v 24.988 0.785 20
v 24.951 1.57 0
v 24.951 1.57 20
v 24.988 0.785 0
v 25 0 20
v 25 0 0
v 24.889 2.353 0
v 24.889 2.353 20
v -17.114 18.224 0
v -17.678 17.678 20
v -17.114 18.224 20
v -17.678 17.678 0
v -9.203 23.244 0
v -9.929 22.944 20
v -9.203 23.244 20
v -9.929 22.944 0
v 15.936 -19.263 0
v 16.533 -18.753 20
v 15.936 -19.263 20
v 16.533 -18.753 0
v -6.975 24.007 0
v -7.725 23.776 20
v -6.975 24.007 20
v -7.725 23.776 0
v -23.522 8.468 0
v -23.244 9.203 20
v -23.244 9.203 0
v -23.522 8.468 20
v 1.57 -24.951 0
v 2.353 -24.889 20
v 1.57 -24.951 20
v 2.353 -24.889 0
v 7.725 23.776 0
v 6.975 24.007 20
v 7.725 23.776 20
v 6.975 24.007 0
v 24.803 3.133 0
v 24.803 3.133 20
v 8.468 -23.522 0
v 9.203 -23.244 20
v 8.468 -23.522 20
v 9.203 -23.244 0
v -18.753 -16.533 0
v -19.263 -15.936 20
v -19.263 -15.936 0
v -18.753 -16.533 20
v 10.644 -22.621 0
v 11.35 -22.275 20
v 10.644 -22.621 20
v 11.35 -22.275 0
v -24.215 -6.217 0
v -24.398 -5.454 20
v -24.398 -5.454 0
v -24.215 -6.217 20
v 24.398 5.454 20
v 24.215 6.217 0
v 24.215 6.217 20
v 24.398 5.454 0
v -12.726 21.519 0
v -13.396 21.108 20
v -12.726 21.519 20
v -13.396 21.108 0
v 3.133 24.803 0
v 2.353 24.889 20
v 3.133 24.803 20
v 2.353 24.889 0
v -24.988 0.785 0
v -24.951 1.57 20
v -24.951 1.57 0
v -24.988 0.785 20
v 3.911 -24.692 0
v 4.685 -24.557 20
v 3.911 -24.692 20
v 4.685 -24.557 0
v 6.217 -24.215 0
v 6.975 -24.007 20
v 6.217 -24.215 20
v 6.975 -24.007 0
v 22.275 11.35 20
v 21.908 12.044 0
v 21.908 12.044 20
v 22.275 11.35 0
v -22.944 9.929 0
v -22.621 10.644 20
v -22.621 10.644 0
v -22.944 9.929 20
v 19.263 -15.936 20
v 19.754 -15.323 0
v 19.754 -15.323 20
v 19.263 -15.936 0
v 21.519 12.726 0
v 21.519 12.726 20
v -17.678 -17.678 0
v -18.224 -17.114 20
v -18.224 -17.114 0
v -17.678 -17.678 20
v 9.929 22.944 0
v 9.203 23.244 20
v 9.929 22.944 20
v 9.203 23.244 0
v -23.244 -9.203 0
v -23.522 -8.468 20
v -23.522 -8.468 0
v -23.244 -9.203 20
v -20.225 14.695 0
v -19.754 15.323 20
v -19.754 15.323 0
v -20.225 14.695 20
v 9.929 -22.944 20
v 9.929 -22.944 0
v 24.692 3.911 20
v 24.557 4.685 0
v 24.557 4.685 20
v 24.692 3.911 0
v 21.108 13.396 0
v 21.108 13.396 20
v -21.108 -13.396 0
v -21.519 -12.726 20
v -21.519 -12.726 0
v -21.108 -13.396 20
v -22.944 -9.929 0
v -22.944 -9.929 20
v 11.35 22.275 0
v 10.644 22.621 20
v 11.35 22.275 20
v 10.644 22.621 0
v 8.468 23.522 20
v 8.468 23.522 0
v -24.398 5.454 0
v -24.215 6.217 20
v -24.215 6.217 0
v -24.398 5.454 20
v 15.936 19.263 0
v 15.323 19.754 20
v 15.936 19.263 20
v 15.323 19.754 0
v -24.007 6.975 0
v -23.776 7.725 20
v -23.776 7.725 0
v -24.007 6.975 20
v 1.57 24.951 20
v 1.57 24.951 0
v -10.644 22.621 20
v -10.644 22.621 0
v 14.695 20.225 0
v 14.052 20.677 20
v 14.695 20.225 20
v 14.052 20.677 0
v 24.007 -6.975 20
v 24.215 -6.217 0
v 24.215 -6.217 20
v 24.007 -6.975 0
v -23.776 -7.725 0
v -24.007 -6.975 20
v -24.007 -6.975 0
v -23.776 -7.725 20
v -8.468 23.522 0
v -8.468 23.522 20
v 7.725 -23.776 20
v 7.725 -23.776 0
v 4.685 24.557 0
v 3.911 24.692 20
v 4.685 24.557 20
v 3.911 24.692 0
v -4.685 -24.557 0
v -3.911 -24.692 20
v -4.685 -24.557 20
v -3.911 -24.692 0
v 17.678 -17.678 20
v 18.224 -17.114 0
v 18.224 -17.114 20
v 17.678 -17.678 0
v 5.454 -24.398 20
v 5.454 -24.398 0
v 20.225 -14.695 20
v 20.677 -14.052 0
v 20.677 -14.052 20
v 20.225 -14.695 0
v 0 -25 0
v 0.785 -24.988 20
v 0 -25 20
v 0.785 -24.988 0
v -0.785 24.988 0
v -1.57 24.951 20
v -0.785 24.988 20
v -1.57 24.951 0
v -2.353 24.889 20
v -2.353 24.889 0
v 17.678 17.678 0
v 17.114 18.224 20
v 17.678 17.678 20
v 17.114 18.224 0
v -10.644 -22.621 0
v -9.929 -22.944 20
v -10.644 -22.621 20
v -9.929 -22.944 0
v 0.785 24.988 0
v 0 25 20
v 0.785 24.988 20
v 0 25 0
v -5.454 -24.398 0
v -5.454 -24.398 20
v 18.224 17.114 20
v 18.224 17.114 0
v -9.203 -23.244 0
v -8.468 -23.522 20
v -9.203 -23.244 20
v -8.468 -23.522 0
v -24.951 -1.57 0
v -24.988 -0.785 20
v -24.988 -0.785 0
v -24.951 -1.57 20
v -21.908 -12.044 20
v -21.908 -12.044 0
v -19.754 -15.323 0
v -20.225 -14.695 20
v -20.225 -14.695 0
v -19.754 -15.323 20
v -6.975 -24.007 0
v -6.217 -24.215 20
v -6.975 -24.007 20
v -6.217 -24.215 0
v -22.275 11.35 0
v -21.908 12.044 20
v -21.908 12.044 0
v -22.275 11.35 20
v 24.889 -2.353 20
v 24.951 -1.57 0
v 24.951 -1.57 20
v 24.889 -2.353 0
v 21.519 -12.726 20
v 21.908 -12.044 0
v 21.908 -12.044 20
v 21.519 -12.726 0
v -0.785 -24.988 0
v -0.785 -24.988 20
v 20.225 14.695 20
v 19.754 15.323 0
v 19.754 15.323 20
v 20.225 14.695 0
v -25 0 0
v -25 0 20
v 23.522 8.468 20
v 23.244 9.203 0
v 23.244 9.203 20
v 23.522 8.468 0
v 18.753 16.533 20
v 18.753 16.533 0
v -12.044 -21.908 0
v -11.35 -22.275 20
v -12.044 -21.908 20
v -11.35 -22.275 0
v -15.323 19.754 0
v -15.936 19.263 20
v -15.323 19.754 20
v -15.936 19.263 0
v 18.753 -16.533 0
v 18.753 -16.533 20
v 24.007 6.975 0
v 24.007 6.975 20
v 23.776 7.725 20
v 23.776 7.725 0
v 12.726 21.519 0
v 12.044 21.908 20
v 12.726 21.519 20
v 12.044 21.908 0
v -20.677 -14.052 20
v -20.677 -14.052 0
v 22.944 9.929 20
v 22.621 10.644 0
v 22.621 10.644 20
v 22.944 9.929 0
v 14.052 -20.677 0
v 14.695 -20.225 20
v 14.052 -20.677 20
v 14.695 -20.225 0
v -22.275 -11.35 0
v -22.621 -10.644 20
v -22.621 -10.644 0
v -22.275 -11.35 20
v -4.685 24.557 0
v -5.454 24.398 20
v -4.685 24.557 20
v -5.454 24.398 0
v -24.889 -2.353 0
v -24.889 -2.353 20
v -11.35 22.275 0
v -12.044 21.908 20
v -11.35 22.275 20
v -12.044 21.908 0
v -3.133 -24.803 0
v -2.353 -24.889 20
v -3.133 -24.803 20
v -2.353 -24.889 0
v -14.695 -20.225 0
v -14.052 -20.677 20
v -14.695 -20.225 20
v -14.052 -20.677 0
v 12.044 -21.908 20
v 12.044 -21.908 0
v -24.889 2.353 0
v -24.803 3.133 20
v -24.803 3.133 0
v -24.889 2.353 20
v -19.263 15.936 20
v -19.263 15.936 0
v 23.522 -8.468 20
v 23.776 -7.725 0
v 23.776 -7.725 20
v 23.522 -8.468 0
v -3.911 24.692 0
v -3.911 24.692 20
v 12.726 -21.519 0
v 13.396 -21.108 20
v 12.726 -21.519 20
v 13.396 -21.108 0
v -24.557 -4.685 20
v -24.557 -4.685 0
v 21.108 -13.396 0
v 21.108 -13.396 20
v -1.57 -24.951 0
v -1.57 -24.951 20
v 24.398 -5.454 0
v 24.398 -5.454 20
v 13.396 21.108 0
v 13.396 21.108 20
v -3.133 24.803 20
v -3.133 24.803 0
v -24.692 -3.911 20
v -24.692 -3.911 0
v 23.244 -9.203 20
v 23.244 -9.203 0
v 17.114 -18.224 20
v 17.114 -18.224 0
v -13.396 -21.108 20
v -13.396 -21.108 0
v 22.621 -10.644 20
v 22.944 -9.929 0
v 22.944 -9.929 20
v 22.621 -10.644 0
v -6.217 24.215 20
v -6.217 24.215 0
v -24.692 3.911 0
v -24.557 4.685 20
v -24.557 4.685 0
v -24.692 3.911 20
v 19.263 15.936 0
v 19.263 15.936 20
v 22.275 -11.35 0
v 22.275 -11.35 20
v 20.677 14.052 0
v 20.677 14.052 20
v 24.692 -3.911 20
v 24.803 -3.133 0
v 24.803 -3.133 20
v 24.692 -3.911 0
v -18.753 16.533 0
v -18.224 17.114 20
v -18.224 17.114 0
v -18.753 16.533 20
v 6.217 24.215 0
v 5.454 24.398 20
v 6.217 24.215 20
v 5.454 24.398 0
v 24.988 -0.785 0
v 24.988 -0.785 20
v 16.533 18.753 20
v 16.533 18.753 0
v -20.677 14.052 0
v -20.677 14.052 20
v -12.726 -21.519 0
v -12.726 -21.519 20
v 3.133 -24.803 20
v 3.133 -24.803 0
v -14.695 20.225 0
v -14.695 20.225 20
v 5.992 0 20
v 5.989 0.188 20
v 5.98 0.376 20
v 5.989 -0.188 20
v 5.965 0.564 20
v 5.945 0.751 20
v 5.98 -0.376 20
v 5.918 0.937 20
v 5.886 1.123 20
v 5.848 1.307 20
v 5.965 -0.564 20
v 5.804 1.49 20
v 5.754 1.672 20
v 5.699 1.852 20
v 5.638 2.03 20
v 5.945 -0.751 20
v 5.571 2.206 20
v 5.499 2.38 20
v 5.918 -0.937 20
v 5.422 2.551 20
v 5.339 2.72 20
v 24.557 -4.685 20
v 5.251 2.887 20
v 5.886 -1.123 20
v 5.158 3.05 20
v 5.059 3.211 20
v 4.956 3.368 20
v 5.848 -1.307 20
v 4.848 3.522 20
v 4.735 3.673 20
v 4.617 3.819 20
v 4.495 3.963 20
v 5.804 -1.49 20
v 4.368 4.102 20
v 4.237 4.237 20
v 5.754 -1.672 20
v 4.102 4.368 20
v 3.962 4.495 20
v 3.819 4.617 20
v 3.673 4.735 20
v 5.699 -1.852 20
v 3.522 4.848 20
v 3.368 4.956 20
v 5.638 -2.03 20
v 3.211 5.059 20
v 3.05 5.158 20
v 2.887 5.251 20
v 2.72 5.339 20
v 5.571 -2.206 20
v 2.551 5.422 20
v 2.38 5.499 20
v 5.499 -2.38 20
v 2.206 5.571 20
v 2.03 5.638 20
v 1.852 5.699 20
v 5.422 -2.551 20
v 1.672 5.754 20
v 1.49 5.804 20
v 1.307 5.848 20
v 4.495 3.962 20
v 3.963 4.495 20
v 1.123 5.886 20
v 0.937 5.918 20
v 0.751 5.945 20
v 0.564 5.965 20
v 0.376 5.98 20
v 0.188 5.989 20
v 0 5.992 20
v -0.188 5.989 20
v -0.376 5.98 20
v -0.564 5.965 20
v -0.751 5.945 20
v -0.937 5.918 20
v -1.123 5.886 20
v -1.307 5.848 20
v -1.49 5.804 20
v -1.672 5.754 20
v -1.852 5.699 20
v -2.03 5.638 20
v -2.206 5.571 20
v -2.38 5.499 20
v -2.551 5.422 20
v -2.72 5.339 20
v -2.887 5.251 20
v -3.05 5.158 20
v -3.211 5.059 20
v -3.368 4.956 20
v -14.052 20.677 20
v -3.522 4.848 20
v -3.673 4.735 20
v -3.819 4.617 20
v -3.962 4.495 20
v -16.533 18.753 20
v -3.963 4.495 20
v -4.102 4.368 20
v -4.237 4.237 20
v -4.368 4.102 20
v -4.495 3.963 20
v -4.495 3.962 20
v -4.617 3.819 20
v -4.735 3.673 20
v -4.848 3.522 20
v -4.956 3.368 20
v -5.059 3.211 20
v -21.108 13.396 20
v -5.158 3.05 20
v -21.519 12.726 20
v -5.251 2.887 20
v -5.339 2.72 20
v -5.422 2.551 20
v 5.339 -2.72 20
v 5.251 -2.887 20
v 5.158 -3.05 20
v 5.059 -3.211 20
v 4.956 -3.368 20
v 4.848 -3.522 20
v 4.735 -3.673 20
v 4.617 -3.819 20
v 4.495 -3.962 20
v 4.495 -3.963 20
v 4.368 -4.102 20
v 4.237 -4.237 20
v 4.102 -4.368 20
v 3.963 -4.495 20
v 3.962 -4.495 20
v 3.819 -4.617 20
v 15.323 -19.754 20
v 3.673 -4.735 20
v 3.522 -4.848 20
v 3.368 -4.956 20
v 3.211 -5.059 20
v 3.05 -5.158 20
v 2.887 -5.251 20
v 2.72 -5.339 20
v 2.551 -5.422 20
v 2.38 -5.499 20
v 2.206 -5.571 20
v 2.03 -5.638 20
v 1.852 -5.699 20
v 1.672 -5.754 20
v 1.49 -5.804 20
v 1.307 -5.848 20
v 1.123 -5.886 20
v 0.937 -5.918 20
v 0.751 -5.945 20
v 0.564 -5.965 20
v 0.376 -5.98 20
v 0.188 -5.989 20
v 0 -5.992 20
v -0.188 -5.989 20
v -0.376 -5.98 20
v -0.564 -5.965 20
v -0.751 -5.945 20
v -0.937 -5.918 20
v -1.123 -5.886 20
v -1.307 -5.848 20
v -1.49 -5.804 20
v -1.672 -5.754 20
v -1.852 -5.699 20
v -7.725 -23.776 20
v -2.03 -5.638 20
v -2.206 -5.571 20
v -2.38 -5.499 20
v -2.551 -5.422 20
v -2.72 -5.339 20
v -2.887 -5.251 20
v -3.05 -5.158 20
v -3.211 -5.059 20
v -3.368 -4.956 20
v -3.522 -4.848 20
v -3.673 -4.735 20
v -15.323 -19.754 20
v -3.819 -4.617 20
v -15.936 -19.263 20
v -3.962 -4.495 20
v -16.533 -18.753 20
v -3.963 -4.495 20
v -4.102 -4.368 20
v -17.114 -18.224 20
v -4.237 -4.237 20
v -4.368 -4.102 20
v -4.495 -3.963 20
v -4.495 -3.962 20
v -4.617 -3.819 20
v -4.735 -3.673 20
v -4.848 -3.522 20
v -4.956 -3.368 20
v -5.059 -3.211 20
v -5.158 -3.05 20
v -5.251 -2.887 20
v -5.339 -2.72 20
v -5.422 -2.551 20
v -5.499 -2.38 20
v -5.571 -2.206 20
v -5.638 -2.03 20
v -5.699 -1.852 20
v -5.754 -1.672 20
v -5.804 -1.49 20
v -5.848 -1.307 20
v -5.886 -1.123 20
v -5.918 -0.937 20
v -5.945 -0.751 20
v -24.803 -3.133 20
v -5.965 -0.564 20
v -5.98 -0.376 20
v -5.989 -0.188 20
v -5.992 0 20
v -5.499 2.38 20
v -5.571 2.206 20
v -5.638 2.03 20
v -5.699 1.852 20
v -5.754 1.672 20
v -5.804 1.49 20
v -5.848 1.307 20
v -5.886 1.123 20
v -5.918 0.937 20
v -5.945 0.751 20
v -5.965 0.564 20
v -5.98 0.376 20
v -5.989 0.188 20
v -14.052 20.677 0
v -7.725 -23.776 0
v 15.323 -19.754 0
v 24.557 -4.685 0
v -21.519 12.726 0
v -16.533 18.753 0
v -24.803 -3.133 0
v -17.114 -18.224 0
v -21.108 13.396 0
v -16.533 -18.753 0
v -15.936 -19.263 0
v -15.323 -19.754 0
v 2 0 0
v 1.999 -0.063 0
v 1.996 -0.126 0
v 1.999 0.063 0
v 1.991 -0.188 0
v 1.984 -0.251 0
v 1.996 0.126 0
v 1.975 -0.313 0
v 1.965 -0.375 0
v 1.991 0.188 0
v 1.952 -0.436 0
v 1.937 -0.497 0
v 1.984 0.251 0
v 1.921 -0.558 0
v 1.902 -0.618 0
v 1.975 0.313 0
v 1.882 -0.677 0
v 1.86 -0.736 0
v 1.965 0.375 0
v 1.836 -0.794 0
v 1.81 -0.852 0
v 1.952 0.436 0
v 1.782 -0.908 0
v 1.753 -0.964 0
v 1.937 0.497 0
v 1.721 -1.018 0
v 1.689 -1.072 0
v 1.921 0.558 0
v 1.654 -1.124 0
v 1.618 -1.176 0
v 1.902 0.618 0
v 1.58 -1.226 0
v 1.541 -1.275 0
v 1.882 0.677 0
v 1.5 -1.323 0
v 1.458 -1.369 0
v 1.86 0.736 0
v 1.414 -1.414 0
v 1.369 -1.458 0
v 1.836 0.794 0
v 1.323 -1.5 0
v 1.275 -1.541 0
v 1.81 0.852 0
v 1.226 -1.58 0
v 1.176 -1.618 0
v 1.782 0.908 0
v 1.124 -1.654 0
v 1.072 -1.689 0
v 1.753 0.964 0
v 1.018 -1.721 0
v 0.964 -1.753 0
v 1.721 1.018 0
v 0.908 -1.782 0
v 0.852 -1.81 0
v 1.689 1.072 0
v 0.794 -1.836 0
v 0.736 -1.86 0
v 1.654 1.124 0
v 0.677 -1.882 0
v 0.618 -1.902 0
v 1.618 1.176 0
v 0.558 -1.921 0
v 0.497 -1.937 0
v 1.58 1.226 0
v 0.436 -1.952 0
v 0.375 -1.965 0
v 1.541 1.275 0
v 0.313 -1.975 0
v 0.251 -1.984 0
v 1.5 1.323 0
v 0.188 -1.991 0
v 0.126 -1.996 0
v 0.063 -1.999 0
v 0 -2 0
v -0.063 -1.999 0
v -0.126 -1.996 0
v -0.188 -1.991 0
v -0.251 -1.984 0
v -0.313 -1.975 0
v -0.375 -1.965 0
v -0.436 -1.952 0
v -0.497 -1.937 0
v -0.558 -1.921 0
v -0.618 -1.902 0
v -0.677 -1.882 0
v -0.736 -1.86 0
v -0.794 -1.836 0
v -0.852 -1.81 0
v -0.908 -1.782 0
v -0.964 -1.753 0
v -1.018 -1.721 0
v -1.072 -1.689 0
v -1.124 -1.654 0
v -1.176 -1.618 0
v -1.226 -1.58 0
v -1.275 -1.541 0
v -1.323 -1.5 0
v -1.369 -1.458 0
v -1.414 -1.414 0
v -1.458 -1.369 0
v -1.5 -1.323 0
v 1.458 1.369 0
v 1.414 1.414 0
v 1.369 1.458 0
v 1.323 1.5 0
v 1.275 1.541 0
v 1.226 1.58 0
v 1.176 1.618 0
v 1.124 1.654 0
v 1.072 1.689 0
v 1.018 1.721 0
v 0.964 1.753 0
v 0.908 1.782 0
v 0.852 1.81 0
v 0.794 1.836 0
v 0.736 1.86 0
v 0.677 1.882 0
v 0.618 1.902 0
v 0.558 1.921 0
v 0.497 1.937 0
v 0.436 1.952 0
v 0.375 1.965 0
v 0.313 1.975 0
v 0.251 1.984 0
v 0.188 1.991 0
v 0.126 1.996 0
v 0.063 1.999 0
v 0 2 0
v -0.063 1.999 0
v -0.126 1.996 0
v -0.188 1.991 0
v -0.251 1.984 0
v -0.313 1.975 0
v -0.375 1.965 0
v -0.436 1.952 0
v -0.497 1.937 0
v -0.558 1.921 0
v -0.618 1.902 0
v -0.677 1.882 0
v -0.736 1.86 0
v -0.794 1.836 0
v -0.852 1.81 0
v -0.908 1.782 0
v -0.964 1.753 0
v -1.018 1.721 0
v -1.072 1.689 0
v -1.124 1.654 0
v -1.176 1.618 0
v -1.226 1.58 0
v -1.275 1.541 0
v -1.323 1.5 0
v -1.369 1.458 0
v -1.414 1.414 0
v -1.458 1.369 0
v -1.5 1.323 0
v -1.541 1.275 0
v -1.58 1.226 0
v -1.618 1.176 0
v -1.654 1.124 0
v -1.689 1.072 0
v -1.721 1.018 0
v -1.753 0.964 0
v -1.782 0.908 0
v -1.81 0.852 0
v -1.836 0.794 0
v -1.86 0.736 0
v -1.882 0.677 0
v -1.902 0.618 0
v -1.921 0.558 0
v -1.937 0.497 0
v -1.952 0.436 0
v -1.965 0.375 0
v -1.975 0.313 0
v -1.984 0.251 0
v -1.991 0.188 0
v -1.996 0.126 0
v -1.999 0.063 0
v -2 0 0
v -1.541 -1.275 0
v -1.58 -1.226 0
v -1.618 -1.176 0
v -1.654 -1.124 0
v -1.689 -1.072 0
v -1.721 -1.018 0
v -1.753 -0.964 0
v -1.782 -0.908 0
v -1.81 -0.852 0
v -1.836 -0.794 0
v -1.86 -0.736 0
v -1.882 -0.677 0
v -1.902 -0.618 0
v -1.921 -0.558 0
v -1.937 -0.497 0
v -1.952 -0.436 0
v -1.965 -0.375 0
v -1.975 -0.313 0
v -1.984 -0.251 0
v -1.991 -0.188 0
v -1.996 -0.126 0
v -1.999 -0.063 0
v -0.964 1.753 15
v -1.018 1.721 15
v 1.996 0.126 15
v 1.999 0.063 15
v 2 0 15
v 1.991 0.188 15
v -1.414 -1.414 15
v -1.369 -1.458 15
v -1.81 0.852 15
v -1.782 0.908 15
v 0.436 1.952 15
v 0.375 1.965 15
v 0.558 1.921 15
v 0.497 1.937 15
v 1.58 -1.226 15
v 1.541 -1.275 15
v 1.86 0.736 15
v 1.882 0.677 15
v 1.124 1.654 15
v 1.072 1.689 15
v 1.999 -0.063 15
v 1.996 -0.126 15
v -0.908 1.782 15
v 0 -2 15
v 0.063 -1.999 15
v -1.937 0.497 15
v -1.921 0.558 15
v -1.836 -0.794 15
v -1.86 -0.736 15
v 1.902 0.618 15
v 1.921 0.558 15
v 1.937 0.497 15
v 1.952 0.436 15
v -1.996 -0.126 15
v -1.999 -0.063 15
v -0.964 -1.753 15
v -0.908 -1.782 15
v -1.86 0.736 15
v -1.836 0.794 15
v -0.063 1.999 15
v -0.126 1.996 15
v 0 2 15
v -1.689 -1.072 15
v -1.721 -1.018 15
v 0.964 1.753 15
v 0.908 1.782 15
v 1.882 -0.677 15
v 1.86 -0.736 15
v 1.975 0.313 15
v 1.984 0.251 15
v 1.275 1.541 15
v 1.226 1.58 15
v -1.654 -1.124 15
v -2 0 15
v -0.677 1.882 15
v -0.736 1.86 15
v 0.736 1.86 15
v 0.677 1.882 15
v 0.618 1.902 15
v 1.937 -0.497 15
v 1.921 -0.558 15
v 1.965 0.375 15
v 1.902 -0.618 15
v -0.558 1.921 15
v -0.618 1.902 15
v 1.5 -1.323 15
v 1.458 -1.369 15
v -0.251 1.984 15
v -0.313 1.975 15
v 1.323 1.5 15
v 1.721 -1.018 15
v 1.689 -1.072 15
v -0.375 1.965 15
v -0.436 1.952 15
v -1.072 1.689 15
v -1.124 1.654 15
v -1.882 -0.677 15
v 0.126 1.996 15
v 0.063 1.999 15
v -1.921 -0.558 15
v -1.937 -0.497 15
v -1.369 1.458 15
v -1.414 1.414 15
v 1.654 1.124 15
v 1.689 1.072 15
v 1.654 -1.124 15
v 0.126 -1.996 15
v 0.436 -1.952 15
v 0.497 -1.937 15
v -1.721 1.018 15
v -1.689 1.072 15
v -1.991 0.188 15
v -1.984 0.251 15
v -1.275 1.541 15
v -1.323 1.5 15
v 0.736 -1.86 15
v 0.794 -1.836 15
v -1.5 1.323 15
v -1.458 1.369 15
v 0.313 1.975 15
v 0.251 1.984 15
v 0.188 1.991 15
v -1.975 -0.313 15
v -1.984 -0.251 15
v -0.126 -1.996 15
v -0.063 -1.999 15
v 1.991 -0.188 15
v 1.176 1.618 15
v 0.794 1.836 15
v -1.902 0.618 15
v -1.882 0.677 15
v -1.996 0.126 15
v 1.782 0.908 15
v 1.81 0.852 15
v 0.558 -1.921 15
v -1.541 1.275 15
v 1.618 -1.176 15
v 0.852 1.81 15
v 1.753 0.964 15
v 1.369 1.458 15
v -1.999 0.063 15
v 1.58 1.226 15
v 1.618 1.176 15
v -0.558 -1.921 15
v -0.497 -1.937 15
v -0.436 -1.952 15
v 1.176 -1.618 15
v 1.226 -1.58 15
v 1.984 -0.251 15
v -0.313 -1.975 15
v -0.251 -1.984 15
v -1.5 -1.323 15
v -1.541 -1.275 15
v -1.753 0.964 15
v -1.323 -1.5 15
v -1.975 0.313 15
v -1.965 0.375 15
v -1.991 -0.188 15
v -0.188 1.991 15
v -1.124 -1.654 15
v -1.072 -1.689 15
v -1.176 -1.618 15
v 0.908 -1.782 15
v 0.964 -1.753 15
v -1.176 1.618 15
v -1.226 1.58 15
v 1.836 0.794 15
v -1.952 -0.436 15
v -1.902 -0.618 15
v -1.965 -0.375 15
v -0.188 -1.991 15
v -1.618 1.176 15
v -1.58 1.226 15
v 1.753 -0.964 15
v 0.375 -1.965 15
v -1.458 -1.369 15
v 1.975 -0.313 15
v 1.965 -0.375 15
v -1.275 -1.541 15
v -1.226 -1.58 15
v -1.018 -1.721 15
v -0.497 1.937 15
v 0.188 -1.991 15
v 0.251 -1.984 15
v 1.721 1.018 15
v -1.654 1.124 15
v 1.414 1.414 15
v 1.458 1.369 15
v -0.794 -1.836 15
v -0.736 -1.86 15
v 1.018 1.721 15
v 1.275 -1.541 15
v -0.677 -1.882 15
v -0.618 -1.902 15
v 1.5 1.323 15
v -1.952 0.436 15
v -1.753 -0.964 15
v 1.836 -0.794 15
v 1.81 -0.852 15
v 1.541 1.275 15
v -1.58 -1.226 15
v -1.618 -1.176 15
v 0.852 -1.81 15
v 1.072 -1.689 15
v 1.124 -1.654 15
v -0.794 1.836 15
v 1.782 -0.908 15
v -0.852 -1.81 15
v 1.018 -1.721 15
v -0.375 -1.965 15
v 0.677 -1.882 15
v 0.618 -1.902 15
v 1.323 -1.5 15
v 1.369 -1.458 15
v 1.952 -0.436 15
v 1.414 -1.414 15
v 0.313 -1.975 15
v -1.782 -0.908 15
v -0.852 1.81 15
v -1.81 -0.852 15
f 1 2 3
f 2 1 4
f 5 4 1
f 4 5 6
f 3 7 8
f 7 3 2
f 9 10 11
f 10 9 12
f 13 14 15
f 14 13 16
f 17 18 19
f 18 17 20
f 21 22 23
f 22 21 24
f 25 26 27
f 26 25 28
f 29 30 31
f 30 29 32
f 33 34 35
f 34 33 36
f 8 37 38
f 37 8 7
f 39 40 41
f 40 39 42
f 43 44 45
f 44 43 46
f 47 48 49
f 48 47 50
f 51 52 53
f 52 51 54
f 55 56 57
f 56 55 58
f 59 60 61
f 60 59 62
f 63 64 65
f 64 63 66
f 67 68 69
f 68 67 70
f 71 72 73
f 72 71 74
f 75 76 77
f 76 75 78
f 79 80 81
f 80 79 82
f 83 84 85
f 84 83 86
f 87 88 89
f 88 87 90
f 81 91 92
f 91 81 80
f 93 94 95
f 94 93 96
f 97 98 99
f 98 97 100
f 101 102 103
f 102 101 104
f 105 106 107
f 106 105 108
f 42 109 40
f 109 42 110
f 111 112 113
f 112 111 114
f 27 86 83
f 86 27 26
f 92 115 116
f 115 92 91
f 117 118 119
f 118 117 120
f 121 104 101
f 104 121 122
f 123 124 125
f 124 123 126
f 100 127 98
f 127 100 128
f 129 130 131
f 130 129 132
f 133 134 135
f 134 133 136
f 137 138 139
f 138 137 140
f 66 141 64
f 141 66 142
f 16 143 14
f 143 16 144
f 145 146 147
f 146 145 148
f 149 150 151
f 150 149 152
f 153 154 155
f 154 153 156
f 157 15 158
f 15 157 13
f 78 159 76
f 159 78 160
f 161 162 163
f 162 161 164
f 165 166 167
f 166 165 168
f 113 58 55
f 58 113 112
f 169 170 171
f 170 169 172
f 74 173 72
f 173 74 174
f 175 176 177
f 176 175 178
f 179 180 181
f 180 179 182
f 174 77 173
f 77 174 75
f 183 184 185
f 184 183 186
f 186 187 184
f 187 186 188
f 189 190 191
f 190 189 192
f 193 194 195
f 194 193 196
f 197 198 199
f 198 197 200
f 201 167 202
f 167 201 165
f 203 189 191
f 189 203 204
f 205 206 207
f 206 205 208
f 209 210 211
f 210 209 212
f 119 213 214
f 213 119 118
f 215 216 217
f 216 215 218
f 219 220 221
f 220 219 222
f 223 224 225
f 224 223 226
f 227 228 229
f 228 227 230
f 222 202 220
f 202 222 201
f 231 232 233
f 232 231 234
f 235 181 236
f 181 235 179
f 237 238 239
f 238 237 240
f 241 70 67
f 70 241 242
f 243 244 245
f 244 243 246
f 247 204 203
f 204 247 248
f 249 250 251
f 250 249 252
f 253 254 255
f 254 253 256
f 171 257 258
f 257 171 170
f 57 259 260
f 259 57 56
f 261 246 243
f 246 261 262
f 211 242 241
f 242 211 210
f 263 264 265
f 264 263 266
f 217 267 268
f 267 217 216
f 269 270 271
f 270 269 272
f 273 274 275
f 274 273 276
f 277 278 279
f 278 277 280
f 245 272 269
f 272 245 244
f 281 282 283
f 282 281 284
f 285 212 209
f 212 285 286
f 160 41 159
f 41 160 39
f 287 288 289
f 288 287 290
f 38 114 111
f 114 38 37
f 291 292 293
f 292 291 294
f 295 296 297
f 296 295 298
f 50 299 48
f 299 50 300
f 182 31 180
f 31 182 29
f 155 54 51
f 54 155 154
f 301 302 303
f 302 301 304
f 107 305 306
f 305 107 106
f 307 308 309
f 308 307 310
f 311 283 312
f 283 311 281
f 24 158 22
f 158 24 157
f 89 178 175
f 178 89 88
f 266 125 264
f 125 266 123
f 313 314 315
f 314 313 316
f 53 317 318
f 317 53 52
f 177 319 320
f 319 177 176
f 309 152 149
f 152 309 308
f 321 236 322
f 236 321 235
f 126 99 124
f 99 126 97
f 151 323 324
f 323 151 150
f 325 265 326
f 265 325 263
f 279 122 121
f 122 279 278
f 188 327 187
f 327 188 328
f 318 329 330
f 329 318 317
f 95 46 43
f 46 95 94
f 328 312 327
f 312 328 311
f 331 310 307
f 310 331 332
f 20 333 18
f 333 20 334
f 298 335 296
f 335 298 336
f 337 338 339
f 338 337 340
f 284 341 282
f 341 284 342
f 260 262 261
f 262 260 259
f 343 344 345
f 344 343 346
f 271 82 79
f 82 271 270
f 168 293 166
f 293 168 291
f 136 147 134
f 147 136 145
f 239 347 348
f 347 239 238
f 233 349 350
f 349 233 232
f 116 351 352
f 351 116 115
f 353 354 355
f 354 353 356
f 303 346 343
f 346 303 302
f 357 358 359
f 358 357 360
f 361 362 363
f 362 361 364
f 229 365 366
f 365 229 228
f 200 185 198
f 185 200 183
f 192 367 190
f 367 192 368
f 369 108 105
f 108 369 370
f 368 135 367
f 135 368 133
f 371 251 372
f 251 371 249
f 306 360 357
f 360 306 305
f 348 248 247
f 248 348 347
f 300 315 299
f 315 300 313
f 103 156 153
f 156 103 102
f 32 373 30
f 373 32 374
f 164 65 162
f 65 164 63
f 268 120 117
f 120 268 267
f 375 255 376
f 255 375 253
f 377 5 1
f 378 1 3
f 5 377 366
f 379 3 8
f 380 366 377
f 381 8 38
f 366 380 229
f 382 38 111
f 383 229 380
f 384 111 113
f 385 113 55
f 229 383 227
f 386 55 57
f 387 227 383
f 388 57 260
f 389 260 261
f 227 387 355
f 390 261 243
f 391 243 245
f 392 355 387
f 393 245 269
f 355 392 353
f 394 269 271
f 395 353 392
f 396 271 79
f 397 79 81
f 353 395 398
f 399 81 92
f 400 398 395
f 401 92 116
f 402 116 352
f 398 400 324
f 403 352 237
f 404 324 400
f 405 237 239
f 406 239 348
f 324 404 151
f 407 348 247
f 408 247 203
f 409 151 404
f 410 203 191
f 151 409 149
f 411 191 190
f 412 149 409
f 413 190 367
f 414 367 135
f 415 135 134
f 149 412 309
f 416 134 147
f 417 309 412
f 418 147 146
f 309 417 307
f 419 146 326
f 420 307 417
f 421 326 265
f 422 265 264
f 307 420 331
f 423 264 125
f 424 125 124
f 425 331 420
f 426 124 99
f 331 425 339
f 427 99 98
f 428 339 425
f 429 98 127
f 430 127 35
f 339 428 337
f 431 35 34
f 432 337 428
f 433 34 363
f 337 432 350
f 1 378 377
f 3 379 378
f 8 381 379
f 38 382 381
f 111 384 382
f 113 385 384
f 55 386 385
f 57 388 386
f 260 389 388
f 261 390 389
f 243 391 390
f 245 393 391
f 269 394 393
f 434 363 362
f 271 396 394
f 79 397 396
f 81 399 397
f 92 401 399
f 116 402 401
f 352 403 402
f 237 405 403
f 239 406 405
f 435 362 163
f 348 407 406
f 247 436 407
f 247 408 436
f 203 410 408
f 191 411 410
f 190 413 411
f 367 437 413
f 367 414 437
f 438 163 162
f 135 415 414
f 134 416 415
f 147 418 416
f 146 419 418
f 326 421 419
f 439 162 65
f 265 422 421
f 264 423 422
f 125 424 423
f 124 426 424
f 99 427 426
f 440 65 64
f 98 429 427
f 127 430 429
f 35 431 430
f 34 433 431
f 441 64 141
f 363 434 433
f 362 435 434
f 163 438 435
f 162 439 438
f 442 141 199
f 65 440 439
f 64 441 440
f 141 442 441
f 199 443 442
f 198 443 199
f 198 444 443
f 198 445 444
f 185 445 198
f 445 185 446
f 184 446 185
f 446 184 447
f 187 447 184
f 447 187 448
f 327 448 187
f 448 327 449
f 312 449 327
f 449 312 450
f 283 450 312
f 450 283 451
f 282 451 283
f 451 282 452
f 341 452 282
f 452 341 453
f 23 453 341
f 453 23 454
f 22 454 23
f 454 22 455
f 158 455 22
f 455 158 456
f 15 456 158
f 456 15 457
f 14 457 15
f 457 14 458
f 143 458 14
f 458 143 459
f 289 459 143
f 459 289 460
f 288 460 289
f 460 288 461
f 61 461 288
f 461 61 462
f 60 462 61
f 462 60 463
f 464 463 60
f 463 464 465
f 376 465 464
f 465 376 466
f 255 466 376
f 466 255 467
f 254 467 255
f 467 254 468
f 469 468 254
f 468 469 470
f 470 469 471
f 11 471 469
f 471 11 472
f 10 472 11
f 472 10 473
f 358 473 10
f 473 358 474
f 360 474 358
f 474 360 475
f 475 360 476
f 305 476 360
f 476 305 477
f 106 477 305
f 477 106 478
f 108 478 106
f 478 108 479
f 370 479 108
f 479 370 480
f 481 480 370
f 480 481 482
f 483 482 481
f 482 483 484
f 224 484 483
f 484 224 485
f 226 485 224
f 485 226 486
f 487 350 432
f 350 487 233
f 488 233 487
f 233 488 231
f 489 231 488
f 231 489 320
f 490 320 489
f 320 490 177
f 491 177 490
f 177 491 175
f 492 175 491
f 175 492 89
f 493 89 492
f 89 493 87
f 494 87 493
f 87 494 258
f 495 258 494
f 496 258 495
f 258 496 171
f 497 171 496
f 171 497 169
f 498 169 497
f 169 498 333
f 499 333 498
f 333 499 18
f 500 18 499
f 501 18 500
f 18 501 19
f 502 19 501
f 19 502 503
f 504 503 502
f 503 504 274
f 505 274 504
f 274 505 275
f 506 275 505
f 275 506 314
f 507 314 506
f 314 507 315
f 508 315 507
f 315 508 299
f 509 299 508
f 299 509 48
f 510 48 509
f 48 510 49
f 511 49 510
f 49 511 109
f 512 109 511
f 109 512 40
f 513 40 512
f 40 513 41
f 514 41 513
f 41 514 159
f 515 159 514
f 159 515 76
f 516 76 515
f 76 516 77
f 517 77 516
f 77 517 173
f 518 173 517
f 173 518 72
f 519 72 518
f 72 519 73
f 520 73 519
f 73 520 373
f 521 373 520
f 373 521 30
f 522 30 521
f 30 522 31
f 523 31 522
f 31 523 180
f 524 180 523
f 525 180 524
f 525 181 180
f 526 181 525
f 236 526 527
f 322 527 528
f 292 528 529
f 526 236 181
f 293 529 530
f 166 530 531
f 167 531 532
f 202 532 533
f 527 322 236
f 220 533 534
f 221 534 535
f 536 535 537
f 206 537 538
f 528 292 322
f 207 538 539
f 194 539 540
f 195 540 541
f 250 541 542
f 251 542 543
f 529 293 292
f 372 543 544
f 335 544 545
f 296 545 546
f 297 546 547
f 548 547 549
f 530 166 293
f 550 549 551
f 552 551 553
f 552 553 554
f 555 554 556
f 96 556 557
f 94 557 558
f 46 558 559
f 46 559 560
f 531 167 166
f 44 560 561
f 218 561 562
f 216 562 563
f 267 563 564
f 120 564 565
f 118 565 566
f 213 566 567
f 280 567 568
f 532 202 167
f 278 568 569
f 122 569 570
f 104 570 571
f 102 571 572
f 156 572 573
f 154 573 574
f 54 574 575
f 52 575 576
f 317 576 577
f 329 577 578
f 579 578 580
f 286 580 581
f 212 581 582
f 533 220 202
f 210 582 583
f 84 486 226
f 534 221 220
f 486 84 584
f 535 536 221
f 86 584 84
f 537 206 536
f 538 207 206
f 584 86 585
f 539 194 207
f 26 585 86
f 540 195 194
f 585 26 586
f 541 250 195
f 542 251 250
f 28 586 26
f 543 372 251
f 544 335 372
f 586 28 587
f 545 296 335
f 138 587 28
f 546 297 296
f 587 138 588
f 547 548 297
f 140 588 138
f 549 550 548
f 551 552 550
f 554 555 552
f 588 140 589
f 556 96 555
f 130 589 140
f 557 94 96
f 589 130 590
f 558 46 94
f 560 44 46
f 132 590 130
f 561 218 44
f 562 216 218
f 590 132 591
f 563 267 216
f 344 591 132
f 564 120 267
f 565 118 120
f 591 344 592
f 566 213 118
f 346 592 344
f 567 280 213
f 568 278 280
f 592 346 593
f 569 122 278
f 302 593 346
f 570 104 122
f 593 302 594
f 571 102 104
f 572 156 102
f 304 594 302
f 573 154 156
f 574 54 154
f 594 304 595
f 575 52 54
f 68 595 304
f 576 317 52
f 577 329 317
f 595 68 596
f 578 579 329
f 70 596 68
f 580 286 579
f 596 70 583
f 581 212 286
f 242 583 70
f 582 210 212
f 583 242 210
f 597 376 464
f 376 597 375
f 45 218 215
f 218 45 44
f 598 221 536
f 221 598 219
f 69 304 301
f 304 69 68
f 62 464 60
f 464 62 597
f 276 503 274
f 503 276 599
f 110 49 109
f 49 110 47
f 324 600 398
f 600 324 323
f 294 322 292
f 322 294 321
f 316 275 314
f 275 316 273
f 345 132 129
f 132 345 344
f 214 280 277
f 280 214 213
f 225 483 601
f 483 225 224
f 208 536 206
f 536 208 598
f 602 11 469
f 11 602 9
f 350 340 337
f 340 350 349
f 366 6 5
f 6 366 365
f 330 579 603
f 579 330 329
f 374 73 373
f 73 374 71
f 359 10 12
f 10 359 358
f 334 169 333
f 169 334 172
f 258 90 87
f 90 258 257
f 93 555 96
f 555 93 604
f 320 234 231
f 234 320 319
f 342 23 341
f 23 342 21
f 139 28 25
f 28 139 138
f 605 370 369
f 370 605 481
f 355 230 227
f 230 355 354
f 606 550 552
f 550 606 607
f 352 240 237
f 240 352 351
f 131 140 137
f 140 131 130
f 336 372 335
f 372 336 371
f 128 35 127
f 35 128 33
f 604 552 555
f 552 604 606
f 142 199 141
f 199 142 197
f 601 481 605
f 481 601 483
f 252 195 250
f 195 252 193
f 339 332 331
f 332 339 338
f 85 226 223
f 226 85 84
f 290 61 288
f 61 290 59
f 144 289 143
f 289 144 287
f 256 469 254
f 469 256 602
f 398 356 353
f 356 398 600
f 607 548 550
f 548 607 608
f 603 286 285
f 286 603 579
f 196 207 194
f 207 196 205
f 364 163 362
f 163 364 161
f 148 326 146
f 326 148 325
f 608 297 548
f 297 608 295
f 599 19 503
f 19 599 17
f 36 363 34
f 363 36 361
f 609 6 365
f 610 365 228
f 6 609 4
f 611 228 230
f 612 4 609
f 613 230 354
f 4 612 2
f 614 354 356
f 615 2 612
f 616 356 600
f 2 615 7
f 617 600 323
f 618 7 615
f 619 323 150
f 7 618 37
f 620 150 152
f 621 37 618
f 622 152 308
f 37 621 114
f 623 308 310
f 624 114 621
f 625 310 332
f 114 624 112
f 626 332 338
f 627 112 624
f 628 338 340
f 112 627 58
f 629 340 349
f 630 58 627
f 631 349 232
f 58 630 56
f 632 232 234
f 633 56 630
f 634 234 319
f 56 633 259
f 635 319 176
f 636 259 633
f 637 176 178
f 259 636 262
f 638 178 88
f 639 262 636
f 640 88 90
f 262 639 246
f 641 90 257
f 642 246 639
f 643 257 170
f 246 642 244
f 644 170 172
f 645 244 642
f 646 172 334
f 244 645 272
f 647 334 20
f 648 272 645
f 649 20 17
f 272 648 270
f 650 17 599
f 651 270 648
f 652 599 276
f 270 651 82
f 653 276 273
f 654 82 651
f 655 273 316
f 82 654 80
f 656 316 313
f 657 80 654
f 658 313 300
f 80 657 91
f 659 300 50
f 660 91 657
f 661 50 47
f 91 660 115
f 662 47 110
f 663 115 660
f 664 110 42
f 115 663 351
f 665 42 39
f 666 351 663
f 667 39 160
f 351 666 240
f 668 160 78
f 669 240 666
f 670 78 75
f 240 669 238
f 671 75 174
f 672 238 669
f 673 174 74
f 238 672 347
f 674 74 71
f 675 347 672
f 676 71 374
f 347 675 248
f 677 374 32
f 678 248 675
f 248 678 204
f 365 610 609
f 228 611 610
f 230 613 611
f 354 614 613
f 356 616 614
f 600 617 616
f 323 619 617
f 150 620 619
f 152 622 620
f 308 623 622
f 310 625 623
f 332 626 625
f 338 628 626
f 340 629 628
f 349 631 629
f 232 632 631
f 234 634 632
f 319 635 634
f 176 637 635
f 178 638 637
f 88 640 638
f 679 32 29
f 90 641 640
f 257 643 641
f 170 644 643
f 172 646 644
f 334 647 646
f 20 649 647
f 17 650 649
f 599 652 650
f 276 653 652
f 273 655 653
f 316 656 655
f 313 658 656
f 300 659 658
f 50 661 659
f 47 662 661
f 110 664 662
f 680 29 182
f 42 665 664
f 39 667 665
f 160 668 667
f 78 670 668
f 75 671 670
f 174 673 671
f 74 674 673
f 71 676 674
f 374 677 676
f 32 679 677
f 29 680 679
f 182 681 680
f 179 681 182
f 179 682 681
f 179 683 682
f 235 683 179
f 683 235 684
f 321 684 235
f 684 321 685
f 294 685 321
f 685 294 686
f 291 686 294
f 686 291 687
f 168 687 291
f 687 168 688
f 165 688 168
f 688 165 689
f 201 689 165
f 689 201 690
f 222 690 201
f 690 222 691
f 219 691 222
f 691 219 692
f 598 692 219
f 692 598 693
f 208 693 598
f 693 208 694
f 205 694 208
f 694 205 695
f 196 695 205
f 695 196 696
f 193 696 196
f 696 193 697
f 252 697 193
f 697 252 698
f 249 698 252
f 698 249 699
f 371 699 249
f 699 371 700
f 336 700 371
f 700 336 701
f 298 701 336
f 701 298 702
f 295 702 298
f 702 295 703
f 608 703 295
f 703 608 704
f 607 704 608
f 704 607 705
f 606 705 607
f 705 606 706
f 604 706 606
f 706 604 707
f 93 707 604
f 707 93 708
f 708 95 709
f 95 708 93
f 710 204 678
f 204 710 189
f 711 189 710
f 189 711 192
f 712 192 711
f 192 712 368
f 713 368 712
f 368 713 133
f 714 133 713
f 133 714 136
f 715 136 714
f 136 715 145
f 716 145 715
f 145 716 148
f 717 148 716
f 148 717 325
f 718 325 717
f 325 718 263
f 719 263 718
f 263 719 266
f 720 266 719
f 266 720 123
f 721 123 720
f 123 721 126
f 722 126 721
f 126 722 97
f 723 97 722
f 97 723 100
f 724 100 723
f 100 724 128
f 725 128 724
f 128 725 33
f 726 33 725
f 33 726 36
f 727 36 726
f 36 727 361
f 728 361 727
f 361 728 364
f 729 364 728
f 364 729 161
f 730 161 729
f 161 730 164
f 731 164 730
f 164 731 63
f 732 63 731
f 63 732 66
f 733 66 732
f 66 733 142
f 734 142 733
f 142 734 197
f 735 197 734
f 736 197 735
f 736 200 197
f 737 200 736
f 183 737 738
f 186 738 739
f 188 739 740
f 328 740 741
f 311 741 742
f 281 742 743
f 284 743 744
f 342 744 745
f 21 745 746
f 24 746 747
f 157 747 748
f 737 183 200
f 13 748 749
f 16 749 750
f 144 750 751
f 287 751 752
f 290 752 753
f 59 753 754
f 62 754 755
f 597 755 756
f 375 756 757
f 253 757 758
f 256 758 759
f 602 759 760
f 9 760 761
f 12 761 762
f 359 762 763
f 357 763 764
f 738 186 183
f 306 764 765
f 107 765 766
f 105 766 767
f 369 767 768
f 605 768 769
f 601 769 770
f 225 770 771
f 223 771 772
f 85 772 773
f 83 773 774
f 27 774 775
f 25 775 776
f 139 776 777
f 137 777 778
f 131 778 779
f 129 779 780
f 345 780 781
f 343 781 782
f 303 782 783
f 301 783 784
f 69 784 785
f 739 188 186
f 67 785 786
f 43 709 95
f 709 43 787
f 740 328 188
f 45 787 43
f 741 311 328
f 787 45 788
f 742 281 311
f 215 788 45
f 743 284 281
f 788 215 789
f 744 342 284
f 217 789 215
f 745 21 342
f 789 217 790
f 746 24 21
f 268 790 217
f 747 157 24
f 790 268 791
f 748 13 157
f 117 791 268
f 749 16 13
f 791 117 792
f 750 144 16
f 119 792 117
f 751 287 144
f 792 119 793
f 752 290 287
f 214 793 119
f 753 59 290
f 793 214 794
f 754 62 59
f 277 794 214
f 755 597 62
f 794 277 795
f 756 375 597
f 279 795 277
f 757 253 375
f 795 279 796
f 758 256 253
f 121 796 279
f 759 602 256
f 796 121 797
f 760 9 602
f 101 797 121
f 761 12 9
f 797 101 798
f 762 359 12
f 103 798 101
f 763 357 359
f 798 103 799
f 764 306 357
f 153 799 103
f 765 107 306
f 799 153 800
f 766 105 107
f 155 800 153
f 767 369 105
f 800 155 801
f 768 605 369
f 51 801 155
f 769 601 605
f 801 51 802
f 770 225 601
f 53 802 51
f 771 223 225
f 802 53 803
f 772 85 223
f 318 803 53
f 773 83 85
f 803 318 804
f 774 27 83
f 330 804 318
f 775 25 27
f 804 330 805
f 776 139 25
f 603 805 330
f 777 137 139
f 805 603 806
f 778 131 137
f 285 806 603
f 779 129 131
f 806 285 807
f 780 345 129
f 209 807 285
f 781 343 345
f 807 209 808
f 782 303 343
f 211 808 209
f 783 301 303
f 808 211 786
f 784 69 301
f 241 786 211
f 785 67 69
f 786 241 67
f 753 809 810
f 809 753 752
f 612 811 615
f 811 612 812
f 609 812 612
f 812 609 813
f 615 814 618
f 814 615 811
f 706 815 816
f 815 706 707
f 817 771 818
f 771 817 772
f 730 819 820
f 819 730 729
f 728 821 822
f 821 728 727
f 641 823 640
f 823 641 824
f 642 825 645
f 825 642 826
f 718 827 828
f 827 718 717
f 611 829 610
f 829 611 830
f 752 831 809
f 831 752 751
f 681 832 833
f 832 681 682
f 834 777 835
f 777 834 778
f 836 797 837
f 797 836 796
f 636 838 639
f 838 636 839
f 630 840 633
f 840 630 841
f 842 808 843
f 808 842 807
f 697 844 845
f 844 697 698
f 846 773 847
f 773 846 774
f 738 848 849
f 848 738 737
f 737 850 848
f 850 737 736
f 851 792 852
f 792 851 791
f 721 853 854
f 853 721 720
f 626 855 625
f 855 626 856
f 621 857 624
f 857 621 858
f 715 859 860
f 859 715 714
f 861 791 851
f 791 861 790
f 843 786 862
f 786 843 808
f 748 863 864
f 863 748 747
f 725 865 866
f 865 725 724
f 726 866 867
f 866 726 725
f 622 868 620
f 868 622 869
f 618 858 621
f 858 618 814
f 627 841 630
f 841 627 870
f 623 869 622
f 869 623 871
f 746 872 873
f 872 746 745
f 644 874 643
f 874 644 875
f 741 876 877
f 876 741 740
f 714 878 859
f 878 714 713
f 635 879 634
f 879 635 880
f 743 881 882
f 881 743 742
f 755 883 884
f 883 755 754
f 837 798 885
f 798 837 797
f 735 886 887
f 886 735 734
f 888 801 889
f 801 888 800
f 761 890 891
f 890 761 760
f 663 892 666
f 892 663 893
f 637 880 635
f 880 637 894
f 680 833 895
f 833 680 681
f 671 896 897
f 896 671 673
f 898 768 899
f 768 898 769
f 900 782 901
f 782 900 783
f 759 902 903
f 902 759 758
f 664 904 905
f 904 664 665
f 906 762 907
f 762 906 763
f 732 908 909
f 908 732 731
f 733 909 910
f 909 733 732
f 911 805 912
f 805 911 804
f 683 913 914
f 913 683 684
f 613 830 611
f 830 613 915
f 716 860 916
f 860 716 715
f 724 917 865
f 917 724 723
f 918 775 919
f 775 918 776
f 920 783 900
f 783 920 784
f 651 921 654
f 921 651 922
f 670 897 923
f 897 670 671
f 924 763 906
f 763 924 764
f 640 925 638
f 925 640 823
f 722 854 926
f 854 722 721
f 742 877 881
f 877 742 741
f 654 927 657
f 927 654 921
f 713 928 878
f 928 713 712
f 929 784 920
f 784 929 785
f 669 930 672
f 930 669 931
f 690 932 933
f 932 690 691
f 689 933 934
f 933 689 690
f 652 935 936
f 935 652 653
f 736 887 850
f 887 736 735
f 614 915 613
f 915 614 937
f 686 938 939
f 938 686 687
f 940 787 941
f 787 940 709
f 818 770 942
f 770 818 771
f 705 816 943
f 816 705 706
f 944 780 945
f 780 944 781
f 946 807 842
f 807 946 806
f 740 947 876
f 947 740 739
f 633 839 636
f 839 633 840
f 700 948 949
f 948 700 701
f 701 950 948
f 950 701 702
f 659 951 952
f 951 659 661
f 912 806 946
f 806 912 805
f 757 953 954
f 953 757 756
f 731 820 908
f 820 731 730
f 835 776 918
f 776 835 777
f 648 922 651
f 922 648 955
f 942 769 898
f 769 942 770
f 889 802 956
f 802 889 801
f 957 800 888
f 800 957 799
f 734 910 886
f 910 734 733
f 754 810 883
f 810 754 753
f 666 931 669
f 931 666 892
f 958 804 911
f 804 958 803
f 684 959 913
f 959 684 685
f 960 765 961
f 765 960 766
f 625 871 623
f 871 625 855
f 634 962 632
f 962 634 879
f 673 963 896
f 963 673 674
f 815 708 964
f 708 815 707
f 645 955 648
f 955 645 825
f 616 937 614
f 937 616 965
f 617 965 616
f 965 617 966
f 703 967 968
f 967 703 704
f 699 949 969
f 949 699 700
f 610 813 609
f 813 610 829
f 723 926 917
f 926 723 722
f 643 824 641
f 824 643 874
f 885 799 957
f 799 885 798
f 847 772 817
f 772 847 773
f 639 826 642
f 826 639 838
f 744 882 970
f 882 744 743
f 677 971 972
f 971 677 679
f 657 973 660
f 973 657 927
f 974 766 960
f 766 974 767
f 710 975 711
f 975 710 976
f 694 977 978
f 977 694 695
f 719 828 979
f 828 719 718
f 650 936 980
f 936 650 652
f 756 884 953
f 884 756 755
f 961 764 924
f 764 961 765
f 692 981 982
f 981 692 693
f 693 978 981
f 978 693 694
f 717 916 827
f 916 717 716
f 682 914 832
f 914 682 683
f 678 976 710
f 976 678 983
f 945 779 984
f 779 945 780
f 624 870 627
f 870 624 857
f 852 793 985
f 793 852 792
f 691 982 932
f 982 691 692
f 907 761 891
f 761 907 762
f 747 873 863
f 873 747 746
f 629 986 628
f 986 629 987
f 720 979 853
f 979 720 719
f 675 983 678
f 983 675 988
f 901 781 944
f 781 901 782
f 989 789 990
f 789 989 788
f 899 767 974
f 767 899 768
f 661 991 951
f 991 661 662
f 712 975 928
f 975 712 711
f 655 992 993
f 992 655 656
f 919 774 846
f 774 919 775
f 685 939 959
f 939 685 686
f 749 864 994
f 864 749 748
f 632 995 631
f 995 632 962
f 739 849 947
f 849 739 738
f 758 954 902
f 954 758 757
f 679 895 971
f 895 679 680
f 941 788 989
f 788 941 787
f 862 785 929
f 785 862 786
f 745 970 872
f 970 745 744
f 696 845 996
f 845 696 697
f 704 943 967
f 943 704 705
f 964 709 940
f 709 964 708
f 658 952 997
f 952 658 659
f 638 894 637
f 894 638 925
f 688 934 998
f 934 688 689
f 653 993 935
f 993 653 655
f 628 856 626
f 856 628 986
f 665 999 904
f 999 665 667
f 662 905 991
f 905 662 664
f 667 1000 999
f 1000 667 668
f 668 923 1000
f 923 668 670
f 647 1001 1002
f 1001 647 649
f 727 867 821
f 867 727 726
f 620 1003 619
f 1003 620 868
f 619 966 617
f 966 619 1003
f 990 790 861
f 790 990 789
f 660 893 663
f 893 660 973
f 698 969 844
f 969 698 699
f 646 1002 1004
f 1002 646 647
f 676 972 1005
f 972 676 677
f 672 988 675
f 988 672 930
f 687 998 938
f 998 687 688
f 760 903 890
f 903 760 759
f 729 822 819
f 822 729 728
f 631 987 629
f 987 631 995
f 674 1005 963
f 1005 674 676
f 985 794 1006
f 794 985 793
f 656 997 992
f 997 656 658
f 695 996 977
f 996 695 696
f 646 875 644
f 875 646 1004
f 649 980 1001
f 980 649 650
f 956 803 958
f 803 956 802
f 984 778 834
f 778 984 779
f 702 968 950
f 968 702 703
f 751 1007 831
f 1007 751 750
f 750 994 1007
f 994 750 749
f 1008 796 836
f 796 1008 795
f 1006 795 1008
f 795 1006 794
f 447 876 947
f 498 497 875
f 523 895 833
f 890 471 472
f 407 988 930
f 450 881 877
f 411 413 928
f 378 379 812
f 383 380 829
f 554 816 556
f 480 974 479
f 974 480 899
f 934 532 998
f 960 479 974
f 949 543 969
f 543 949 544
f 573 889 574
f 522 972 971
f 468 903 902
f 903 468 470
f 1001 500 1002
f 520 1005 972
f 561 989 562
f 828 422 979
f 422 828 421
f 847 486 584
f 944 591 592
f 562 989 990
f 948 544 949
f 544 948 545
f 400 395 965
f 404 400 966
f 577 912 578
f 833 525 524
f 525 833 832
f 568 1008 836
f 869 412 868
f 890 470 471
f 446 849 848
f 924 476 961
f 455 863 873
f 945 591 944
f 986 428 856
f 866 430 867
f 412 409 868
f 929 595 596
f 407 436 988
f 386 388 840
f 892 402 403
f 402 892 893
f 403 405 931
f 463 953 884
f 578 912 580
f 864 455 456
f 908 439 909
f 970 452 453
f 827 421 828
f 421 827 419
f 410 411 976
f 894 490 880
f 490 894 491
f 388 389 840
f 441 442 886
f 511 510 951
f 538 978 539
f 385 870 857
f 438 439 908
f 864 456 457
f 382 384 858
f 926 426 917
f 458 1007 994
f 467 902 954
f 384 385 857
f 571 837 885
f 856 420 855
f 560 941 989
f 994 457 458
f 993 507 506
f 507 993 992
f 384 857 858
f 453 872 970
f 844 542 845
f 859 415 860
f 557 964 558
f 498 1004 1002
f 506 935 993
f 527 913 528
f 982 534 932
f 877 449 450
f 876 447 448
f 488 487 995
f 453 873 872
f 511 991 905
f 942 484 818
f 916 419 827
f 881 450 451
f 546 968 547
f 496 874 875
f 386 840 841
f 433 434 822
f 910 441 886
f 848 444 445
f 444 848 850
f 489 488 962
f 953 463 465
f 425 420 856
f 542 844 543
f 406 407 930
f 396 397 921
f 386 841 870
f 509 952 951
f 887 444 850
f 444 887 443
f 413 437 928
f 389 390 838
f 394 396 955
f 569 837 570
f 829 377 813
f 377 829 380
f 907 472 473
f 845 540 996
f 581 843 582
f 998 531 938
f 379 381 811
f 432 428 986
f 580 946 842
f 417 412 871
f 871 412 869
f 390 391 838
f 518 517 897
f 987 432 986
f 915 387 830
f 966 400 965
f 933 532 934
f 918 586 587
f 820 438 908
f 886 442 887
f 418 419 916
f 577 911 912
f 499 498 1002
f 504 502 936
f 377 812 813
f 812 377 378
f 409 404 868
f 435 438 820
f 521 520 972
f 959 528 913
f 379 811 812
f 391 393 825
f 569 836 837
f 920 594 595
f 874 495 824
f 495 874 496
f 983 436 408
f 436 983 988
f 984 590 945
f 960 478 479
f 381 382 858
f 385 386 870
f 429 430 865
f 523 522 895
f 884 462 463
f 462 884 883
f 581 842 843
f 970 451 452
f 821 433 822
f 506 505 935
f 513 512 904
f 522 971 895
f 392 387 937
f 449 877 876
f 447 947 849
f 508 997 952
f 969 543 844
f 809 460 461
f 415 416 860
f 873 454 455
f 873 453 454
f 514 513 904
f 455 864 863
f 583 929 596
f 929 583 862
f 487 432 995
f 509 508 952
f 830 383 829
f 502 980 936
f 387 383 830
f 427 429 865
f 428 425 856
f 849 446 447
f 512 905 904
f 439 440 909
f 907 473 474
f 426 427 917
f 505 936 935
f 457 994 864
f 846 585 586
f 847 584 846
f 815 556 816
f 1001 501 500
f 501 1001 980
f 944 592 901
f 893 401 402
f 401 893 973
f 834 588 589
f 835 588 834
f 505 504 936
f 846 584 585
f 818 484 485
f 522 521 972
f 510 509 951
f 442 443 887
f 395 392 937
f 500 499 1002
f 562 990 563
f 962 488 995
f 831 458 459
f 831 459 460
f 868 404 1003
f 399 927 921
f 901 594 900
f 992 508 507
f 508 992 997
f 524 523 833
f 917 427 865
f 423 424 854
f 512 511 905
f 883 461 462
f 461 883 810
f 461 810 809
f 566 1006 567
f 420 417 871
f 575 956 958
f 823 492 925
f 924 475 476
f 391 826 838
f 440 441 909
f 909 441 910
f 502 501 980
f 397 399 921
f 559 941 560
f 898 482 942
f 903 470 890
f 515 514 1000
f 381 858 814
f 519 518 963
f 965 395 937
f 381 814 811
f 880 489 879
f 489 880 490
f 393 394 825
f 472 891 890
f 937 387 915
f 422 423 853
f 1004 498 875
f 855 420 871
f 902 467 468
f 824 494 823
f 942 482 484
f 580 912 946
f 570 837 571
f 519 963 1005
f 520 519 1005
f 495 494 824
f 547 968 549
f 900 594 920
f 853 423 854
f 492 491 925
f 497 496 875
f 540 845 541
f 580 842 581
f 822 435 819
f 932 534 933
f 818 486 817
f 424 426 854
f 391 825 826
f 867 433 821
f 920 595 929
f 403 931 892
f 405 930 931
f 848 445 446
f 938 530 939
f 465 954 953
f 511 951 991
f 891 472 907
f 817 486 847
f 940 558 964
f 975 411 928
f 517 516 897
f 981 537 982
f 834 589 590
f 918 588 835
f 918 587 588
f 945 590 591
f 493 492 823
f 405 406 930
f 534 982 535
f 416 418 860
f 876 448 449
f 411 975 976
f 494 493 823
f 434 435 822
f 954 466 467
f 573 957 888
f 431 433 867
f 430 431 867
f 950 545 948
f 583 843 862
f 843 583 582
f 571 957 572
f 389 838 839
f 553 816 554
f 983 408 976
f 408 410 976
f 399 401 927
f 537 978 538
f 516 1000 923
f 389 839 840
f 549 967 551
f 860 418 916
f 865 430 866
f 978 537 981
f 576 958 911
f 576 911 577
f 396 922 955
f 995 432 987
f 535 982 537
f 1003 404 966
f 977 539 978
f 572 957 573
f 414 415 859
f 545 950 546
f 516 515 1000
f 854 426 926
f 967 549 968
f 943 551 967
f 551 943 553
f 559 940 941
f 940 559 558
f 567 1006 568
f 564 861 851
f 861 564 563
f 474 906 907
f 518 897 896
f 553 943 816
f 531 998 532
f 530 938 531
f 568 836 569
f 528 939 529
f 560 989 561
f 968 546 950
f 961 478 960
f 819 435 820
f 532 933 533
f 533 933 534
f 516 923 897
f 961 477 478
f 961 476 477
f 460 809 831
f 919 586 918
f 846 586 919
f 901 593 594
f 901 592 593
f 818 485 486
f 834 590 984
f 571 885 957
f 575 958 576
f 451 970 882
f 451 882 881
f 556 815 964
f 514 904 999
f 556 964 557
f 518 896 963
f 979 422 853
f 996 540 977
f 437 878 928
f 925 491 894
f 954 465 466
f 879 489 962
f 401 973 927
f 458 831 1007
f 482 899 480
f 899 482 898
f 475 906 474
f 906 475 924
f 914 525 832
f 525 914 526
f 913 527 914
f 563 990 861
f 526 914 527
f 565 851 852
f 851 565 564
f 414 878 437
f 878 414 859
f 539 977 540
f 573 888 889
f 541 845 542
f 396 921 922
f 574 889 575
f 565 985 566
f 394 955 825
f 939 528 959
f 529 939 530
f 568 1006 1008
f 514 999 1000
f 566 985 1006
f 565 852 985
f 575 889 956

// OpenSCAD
$fn = 200;
$fs = 0.01;

difference()
{
    cylinder(20, 25, 25);

    translate([0,0,-$fs/2])
    cylinder(20+$fs, 2, 2);

    translate([0,0,20-5])
    cylinder(5+$fs, 2, 6);
}
